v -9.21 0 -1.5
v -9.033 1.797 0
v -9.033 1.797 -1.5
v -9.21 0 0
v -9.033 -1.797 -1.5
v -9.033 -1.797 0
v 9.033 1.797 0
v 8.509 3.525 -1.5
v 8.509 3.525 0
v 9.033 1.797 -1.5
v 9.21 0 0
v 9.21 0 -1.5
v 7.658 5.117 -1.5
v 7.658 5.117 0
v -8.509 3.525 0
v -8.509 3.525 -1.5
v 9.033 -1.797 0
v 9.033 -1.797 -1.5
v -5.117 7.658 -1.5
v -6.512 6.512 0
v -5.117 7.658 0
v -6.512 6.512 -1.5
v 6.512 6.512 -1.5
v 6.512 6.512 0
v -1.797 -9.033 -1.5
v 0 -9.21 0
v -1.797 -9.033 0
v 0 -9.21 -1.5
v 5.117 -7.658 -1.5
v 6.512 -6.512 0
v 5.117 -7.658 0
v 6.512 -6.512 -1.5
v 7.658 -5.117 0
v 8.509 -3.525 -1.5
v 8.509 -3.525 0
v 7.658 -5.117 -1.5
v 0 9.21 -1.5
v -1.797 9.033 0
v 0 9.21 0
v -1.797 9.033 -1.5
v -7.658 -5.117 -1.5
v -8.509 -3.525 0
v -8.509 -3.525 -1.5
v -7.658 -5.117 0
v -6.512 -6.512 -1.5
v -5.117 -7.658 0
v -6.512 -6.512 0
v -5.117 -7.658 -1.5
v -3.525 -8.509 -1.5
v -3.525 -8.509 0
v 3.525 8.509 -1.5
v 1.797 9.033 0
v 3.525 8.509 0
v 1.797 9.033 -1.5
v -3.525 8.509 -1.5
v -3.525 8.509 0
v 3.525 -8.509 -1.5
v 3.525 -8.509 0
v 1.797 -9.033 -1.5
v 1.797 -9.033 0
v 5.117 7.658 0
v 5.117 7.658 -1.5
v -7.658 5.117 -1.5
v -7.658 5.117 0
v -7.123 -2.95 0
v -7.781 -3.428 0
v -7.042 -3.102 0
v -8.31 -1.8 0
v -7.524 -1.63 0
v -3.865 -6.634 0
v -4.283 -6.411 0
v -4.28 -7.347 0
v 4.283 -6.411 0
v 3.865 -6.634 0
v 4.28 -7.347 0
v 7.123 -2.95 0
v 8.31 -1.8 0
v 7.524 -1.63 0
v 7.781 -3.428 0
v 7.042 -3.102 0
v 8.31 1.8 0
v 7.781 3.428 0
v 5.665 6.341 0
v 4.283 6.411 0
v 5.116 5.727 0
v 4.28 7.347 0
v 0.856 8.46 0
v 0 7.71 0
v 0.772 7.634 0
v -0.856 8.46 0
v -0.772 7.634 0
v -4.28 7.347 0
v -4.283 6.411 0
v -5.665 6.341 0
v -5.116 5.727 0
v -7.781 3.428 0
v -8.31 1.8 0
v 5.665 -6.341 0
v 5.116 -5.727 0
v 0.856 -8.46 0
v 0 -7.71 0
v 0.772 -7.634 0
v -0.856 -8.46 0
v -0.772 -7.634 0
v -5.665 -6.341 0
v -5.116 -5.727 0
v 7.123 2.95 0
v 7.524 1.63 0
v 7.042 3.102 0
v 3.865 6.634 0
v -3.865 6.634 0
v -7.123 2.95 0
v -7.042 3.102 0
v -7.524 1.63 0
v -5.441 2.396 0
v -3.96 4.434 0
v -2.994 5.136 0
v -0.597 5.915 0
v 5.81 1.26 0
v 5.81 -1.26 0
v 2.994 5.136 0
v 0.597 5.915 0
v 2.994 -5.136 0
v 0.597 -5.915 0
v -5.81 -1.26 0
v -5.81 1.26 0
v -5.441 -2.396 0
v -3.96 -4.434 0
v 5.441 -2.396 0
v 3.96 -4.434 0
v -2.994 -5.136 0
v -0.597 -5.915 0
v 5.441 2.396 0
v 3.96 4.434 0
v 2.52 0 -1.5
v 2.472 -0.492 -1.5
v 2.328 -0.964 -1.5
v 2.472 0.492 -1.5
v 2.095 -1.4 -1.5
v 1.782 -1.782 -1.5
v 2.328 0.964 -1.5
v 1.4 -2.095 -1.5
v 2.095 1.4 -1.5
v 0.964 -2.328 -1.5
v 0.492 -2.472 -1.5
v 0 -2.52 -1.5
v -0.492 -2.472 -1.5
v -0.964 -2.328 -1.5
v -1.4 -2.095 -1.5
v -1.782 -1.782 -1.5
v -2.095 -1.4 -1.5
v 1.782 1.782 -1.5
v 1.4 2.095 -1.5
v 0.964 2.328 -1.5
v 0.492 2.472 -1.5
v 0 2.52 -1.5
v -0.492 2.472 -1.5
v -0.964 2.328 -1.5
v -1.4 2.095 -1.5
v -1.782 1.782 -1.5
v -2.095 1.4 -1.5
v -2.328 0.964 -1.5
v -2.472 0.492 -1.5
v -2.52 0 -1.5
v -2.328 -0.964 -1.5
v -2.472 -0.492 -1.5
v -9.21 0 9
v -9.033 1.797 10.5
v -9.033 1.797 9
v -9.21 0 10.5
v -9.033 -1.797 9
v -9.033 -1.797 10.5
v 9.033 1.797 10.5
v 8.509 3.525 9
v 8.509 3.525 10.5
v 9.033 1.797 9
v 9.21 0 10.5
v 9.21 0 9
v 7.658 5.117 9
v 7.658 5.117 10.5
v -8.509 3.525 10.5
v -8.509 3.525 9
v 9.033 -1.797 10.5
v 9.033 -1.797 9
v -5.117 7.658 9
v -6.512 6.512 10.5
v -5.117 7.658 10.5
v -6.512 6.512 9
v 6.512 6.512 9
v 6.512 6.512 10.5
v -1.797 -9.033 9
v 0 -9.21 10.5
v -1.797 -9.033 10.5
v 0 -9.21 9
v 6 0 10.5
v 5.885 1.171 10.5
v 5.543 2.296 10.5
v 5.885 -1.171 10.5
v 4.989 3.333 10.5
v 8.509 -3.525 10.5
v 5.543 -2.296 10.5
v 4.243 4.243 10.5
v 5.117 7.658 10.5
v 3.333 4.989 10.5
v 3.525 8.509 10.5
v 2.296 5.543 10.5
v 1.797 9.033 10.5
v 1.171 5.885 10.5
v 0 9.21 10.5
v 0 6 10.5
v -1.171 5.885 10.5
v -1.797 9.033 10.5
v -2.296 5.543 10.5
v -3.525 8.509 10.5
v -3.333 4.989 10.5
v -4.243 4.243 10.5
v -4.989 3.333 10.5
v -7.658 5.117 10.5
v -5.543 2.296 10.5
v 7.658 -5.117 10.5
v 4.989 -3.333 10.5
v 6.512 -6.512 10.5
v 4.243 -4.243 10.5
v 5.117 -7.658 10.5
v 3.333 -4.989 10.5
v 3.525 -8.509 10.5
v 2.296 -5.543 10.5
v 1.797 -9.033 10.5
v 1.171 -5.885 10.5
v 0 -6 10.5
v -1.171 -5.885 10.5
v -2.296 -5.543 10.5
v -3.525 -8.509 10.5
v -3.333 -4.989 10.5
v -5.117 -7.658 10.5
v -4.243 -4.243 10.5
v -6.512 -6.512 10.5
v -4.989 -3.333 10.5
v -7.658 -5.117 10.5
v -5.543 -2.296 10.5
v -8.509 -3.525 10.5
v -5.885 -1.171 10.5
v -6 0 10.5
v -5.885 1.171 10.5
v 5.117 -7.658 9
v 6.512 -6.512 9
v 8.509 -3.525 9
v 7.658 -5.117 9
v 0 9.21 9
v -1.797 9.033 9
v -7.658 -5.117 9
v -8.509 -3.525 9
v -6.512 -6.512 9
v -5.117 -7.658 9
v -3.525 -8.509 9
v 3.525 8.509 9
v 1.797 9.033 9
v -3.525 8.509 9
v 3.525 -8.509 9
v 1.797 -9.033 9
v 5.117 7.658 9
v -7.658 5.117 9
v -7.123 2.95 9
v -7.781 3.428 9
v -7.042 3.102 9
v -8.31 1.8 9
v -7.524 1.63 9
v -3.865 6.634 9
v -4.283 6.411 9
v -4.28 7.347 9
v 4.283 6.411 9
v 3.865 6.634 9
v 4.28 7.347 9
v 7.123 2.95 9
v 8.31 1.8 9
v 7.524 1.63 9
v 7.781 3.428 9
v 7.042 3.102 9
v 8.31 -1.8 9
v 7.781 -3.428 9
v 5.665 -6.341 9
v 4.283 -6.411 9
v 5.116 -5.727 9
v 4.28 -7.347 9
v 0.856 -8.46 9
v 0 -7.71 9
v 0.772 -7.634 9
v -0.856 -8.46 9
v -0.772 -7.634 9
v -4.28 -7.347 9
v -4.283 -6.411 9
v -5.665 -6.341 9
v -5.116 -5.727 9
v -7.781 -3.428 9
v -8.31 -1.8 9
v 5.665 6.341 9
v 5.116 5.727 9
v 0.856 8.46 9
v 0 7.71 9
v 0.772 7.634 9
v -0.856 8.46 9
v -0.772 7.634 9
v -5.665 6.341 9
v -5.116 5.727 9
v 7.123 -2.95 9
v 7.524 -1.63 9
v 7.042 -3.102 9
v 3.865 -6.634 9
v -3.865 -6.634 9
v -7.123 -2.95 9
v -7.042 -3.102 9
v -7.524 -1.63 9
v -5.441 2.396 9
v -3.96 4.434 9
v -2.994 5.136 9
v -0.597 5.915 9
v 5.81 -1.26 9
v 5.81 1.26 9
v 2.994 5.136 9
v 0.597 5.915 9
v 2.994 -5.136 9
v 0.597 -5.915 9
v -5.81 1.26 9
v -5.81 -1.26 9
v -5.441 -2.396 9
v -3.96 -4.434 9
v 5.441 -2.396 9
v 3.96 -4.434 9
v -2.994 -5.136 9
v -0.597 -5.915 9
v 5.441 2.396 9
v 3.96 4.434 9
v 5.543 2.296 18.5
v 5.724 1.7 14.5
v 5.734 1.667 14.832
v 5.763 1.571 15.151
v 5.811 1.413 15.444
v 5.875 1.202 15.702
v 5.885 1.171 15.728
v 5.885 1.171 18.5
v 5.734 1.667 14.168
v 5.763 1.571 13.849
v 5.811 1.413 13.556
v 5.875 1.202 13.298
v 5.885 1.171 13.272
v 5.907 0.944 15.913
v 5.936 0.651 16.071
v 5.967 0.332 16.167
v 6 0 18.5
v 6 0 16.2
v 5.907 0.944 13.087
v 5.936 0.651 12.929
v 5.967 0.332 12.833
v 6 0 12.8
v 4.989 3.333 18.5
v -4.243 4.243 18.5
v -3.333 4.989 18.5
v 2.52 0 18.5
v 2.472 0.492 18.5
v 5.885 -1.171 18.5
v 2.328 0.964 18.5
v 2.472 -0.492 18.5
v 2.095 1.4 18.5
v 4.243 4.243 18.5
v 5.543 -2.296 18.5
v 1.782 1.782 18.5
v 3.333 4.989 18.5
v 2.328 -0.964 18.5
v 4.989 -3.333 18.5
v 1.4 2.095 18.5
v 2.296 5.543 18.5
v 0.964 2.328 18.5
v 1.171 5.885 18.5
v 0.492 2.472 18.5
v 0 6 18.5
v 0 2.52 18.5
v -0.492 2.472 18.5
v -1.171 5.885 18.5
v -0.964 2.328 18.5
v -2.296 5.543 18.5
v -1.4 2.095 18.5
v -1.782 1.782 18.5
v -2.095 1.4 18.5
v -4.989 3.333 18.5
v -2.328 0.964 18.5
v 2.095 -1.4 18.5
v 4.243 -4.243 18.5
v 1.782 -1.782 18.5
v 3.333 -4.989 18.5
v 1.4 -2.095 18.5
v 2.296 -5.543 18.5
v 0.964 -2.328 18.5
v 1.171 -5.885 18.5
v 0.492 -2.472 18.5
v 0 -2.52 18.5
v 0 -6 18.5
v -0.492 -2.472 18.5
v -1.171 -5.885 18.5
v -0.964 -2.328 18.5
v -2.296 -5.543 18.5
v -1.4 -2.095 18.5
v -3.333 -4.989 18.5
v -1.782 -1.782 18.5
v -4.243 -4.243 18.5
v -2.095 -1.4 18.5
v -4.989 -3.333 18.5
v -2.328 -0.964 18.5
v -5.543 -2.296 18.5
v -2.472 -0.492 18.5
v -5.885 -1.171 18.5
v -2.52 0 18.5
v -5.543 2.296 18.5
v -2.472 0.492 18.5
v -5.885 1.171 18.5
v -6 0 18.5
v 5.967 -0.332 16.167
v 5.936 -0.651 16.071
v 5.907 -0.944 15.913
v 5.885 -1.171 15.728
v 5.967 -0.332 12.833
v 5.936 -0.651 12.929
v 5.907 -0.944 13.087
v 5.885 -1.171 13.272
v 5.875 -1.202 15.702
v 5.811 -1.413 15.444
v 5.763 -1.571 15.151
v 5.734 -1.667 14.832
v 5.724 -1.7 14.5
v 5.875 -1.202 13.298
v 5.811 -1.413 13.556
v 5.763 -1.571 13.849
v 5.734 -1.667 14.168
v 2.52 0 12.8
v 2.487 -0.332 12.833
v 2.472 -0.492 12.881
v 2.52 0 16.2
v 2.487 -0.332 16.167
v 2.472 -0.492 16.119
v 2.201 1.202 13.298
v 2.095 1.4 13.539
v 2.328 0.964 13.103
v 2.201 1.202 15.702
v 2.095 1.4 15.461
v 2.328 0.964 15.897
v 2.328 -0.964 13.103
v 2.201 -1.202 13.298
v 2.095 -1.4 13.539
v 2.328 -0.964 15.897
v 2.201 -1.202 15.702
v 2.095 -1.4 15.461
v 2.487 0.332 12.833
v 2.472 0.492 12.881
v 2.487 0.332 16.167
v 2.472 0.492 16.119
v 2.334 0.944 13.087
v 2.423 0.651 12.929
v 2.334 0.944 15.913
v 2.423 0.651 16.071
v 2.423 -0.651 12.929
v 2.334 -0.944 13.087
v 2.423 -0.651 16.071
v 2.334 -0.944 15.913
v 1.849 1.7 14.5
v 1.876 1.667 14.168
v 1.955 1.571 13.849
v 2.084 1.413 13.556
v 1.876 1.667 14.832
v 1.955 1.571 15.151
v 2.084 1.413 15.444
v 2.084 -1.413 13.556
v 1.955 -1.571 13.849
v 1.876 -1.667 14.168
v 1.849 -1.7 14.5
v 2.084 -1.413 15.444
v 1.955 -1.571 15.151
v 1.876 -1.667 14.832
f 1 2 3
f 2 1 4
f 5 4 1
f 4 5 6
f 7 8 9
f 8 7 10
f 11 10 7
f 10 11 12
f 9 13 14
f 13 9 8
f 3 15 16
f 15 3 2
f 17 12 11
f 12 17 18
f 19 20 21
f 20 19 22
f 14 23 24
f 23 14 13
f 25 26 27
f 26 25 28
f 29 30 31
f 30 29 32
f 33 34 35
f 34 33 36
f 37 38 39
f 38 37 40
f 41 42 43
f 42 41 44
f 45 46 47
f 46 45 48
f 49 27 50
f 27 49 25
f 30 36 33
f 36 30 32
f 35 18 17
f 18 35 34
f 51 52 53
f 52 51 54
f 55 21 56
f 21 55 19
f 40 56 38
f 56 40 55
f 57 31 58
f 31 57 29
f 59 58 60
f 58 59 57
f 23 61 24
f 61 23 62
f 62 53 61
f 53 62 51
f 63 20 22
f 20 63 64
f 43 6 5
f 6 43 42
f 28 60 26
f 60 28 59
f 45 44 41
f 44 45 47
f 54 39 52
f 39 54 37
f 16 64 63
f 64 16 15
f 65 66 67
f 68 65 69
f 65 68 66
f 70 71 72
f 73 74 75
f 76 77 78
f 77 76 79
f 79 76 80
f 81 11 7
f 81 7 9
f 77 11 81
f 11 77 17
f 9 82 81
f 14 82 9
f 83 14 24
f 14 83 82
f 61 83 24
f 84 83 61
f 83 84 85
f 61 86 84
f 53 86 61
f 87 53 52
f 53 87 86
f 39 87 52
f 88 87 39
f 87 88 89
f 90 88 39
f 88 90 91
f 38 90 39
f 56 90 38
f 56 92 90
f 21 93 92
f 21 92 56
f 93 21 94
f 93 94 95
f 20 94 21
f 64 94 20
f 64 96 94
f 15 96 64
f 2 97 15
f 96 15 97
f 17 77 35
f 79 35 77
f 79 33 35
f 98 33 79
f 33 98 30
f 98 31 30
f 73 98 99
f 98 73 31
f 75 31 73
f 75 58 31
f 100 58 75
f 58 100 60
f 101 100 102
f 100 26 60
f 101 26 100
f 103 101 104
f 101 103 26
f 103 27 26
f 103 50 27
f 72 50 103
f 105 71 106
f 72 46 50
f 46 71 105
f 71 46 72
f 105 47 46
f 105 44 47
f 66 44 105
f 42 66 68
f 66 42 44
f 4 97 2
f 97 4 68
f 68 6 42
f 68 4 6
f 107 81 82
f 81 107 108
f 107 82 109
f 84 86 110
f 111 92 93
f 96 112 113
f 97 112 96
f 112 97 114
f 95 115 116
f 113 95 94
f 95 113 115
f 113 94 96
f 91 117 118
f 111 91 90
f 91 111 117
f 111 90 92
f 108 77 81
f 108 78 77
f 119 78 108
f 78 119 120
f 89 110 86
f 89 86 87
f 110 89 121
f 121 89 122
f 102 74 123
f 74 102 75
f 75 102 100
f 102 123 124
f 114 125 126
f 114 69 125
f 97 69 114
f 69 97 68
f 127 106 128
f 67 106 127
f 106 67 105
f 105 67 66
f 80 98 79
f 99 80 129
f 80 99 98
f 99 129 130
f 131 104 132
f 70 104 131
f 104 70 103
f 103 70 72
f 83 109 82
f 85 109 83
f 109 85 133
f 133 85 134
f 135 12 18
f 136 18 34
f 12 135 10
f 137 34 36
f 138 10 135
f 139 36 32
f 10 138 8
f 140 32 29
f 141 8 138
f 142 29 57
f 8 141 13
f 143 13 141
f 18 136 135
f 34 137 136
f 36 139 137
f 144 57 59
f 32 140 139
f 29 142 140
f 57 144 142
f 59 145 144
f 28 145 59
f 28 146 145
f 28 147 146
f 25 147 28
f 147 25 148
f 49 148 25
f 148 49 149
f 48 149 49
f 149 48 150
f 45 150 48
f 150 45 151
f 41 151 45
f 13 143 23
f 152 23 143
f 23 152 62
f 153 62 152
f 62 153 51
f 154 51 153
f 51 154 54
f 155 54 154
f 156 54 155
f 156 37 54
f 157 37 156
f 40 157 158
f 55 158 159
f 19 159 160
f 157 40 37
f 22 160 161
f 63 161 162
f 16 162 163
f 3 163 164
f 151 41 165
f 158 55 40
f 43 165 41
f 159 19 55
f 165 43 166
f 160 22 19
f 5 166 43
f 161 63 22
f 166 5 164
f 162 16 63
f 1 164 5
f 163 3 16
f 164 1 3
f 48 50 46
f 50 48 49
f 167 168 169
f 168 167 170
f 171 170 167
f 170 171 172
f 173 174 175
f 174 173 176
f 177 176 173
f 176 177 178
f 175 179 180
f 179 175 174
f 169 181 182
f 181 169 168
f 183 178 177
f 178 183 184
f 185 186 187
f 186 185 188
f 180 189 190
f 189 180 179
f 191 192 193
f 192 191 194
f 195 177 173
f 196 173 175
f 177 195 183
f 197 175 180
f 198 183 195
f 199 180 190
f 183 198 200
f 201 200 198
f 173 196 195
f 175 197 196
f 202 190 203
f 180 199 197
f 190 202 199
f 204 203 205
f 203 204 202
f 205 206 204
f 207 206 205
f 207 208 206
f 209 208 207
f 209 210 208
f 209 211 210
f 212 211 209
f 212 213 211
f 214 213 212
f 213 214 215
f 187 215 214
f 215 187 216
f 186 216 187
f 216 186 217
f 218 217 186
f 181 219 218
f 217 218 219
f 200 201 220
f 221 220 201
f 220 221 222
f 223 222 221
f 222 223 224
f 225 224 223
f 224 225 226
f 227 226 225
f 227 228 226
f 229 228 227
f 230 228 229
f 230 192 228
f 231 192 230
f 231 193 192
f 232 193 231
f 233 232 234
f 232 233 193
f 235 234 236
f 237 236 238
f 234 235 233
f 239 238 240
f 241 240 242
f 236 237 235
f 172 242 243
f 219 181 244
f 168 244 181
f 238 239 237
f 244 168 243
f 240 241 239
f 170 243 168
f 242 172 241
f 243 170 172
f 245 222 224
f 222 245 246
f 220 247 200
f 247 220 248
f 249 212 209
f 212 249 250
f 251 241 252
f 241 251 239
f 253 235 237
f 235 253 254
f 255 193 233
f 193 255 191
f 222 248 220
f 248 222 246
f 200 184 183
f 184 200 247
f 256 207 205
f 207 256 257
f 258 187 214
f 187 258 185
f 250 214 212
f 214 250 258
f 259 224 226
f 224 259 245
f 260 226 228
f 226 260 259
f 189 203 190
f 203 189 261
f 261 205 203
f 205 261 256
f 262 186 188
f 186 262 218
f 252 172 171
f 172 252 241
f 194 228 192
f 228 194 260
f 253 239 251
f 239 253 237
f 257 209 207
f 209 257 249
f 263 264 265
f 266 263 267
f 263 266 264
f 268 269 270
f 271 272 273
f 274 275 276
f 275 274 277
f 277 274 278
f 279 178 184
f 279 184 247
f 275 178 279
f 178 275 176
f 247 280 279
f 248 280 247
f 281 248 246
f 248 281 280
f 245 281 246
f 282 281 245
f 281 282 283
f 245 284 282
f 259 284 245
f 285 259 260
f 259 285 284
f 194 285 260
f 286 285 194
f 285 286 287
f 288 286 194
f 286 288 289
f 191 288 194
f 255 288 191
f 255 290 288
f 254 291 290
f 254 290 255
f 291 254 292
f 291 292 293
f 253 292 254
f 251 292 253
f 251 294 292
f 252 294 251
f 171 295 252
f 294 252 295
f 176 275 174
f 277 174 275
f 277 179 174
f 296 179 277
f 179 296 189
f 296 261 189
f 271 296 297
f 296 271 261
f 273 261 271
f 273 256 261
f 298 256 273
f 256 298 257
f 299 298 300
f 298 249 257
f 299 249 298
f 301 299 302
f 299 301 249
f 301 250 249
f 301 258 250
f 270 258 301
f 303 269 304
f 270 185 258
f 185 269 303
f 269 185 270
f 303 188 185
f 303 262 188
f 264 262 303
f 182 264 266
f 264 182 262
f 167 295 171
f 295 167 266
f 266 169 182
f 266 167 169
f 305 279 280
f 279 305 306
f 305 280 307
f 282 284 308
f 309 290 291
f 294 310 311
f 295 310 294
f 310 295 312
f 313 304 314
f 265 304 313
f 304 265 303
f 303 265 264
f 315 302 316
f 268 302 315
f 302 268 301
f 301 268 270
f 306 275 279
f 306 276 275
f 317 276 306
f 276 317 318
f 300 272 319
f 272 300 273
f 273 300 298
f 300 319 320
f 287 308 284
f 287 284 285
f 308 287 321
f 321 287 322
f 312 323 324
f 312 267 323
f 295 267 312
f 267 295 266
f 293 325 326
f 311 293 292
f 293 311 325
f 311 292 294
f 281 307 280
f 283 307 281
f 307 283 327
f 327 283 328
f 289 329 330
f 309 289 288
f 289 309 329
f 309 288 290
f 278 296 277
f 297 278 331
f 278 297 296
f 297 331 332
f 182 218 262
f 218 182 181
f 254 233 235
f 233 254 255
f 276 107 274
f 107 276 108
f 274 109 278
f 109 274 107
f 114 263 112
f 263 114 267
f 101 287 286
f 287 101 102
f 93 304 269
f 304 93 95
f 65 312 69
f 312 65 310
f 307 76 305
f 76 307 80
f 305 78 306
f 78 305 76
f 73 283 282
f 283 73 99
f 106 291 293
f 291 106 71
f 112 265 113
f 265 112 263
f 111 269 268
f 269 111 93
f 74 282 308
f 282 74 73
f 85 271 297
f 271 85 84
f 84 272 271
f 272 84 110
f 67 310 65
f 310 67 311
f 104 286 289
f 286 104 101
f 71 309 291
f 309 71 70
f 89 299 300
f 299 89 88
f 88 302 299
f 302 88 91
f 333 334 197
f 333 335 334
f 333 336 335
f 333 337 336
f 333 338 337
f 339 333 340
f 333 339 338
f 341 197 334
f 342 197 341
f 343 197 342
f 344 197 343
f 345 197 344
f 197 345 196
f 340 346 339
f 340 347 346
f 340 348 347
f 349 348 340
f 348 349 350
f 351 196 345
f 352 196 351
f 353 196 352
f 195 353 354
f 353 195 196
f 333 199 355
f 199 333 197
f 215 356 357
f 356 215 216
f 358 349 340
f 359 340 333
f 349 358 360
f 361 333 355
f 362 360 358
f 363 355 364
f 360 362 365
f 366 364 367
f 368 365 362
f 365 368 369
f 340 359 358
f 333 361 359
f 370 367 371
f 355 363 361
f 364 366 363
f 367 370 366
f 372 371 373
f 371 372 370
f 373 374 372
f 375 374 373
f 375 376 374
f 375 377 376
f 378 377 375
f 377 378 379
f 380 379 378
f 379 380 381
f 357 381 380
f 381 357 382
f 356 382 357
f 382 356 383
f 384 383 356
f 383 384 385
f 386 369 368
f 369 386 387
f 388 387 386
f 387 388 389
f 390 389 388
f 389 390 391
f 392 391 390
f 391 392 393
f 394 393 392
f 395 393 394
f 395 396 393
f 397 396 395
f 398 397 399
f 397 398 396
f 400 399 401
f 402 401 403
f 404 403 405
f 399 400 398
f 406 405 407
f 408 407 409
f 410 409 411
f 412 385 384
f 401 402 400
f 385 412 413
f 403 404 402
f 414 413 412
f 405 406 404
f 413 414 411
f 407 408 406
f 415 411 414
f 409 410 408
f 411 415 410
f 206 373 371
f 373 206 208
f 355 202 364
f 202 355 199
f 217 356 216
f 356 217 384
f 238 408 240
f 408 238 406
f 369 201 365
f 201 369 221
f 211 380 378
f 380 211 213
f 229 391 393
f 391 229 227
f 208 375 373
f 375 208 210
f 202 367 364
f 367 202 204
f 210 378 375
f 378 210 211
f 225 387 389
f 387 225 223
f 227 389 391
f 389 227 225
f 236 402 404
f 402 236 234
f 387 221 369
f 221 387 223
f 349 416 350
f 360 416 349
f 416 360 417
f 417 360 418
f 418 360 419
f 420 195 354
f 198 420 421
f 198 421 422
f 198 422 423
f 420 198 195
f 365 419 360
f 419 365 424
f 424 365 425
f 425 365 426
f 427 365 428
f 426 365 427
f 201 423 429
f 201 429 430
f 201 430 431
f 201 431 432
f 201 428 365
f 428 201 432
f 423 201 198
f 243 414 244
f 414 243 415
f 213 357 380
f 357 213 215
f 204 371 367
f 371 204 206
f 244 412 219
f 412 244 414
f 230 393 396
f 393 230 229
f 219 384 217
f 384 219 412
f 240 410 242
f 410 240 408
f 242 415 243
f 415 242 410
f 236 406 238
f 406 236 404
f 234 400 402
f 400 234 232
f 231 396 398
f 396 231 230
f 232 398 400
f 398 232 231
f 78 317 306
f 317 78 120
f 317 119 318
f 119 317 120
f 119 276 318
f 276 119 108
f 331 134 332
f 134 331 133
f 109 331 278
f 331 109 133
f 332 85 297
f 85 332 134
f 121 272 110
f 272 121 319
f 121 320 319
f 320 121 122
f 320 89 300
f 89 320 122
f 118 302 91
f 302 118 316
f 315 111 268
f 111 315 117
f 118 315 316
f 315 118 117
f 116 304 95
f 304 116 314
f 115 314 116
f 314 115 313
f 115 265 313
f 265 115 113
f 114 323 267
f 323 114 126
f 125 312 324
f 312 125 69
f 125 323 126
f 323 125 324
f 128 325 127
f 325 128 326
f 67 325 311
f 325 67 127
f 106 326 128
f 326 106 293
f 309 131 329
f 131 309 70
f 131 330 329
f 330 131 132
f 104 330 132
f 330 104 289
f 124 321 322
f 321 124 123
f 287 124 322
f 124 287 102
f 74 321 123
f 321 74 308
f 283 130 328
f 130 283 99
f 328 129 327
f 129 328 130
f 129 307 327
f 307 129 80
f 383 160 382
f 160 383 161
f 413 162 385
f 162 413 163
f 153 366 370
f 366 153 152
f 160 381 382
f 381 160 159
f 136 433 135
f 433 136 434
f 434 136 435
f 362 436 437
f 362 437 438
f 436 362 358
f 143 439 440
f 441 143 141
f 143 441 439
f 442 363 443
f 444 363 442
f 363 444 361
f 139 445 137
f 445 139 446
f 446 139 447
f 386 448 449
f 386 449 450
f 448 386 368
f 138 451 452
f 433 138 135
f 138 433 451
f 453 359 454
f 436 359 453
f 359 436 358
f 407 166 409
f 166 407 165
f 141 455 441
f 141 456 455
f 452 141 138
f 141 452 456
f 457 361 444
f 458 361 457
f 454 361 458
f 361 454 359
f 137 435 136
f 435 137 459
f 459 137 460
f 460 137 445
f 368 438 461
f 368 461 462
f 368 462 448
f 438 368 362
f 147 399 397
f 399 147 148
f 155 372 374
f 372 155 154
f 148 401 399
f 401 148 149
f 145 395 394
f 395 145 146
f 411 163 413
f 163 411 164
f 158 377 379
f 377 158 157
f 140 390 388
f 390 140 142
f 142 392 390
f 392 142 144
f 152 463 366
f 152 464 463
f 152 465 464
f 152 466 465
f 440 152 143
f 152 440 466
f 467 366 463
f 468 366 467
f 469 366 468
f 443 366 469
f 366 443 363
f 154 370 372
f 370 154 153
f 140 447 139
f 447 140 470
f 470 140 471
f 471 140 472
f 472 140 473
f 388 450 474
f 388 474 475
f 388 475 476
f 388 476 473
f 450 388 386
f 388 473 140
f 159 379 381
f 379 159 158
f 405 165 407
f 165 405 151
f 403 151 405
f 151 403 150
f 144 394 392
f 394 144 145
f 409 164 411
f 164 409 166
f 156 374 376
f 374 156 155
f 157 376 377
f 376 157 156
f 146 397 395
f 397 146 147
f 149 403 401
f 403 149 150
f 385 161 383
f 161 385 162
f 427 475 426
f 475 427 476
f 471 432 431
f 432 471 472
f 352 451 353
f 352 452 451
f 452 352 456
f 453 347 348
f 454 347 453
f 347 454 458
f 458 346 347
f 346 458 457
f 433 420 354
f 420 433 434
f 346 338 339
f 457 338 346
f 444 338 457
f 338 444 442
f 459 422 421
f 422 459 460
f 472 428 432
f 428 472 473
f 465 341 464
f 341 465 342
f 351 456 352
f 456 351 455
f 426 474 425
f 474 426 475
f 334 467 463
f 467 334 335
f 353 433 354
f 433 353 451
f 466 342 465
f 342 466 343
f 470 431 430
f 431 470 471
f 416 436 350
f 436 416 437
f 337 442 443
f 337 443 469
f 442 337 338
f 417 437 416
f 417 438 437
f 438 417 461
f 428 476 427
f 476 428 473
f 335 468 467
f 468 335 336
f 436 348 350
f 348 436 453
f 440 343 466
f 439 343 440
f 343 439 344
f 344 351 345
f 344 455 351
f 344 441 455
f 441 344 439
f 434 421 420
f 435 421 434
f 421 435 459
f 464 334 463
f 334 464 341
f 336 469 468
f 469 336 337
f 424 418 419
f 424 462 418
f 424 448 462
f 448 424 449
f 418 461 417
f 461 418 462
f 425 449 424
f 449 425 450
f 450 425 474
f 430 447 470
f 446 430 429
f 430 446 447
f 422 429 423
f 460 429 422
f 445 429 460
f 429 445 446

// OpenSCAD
$fn = 32;

// ----------------------------------------------------------------------
// Timing pulley: T5 10T, pitch 5 mm, 18.42 mm x 20 mm
// ----------------------------------------------------------------------

// --- parameters (mm) ---
pitch = 5;                // belt pitch
teeth = 10;               // number of grooves
belt_w = 9;               // belt width between the flanges
tip_d = 15.42;            // tip circle diameter
root_d = 12.82;           // groove bottom diameter
groove_h = 1.3;           // groove depth
tooth_w = 3;              // groove width at the tip circle
flange_d = 18.42;         // flange diameter
flange_t = 1.5;           // flange thickness
spigot_d = 11.22;         // flange spigot, sunk into the rim
spigot_h = 1.2;           // spigot depth into the rim
bore_d = 5.04;            // shaft bore
hub_d = 12;               // hub diameter
hub_h = 8;                // hub above the flange
bottom_z = -1.5;          // lowest point of the pulley
top_z = 18.5;             // highest point of the pulley
set_d = 3.4;              // set screw tap hole

module rim() {
  cylinder(h = belt_w, d = tip_d);
}

module groove_cutter() {
  /* belt tooth groove: deeper than wide, cut through the belt width */
  translate([root_d / 2, 0, 0])
    linear_extrude(height = belt_w)
      polygon(points = [[-0.6, -tooth_w * 0.42], [groove_h + 0.6, -tooth_w * 0.6],
                        [groove_h + 0.6, tooth_w * 0.6], [-0.6, tooth_w * 0.42]]);
}

module flanges() {
  translate([0, 0, -flange_t]) cylinder(h = flange_t, d = flange_d);
  translate([0, 0, belt_w]) cylinder(h = flange_t, d = flange_d);
  translate([0, 0, -spigot_h]) cylinder(h = spigot_h + 0.6, d = spigot_d);
  translate([0, 0, belt_w - 0.6]) cylinder(h = spigot_h + 0.6, d = spigot_d);
}

module hub() {
  translate([0, 0, bottom_z]) cylinder(h = top_z - bottom_z, d = hub_d);
}

difference() {
  union() {
    rim();
    hub();
    flanges();
  }
  for (i = [0 : teeth - 1]) rotate([0, 0, i * 360 / teeth]) groove_cutter();
  translate([0, 0, bottom_z - 1]) cylinder(h = top_z - bottom_z + 2, d = bore_d);
  translate([-1, 0, top_z - hub_h * 0.5]) rotate([0, 90, 0]) cylinder(h = hub_d / 2 + 3, d = set_d);
}
